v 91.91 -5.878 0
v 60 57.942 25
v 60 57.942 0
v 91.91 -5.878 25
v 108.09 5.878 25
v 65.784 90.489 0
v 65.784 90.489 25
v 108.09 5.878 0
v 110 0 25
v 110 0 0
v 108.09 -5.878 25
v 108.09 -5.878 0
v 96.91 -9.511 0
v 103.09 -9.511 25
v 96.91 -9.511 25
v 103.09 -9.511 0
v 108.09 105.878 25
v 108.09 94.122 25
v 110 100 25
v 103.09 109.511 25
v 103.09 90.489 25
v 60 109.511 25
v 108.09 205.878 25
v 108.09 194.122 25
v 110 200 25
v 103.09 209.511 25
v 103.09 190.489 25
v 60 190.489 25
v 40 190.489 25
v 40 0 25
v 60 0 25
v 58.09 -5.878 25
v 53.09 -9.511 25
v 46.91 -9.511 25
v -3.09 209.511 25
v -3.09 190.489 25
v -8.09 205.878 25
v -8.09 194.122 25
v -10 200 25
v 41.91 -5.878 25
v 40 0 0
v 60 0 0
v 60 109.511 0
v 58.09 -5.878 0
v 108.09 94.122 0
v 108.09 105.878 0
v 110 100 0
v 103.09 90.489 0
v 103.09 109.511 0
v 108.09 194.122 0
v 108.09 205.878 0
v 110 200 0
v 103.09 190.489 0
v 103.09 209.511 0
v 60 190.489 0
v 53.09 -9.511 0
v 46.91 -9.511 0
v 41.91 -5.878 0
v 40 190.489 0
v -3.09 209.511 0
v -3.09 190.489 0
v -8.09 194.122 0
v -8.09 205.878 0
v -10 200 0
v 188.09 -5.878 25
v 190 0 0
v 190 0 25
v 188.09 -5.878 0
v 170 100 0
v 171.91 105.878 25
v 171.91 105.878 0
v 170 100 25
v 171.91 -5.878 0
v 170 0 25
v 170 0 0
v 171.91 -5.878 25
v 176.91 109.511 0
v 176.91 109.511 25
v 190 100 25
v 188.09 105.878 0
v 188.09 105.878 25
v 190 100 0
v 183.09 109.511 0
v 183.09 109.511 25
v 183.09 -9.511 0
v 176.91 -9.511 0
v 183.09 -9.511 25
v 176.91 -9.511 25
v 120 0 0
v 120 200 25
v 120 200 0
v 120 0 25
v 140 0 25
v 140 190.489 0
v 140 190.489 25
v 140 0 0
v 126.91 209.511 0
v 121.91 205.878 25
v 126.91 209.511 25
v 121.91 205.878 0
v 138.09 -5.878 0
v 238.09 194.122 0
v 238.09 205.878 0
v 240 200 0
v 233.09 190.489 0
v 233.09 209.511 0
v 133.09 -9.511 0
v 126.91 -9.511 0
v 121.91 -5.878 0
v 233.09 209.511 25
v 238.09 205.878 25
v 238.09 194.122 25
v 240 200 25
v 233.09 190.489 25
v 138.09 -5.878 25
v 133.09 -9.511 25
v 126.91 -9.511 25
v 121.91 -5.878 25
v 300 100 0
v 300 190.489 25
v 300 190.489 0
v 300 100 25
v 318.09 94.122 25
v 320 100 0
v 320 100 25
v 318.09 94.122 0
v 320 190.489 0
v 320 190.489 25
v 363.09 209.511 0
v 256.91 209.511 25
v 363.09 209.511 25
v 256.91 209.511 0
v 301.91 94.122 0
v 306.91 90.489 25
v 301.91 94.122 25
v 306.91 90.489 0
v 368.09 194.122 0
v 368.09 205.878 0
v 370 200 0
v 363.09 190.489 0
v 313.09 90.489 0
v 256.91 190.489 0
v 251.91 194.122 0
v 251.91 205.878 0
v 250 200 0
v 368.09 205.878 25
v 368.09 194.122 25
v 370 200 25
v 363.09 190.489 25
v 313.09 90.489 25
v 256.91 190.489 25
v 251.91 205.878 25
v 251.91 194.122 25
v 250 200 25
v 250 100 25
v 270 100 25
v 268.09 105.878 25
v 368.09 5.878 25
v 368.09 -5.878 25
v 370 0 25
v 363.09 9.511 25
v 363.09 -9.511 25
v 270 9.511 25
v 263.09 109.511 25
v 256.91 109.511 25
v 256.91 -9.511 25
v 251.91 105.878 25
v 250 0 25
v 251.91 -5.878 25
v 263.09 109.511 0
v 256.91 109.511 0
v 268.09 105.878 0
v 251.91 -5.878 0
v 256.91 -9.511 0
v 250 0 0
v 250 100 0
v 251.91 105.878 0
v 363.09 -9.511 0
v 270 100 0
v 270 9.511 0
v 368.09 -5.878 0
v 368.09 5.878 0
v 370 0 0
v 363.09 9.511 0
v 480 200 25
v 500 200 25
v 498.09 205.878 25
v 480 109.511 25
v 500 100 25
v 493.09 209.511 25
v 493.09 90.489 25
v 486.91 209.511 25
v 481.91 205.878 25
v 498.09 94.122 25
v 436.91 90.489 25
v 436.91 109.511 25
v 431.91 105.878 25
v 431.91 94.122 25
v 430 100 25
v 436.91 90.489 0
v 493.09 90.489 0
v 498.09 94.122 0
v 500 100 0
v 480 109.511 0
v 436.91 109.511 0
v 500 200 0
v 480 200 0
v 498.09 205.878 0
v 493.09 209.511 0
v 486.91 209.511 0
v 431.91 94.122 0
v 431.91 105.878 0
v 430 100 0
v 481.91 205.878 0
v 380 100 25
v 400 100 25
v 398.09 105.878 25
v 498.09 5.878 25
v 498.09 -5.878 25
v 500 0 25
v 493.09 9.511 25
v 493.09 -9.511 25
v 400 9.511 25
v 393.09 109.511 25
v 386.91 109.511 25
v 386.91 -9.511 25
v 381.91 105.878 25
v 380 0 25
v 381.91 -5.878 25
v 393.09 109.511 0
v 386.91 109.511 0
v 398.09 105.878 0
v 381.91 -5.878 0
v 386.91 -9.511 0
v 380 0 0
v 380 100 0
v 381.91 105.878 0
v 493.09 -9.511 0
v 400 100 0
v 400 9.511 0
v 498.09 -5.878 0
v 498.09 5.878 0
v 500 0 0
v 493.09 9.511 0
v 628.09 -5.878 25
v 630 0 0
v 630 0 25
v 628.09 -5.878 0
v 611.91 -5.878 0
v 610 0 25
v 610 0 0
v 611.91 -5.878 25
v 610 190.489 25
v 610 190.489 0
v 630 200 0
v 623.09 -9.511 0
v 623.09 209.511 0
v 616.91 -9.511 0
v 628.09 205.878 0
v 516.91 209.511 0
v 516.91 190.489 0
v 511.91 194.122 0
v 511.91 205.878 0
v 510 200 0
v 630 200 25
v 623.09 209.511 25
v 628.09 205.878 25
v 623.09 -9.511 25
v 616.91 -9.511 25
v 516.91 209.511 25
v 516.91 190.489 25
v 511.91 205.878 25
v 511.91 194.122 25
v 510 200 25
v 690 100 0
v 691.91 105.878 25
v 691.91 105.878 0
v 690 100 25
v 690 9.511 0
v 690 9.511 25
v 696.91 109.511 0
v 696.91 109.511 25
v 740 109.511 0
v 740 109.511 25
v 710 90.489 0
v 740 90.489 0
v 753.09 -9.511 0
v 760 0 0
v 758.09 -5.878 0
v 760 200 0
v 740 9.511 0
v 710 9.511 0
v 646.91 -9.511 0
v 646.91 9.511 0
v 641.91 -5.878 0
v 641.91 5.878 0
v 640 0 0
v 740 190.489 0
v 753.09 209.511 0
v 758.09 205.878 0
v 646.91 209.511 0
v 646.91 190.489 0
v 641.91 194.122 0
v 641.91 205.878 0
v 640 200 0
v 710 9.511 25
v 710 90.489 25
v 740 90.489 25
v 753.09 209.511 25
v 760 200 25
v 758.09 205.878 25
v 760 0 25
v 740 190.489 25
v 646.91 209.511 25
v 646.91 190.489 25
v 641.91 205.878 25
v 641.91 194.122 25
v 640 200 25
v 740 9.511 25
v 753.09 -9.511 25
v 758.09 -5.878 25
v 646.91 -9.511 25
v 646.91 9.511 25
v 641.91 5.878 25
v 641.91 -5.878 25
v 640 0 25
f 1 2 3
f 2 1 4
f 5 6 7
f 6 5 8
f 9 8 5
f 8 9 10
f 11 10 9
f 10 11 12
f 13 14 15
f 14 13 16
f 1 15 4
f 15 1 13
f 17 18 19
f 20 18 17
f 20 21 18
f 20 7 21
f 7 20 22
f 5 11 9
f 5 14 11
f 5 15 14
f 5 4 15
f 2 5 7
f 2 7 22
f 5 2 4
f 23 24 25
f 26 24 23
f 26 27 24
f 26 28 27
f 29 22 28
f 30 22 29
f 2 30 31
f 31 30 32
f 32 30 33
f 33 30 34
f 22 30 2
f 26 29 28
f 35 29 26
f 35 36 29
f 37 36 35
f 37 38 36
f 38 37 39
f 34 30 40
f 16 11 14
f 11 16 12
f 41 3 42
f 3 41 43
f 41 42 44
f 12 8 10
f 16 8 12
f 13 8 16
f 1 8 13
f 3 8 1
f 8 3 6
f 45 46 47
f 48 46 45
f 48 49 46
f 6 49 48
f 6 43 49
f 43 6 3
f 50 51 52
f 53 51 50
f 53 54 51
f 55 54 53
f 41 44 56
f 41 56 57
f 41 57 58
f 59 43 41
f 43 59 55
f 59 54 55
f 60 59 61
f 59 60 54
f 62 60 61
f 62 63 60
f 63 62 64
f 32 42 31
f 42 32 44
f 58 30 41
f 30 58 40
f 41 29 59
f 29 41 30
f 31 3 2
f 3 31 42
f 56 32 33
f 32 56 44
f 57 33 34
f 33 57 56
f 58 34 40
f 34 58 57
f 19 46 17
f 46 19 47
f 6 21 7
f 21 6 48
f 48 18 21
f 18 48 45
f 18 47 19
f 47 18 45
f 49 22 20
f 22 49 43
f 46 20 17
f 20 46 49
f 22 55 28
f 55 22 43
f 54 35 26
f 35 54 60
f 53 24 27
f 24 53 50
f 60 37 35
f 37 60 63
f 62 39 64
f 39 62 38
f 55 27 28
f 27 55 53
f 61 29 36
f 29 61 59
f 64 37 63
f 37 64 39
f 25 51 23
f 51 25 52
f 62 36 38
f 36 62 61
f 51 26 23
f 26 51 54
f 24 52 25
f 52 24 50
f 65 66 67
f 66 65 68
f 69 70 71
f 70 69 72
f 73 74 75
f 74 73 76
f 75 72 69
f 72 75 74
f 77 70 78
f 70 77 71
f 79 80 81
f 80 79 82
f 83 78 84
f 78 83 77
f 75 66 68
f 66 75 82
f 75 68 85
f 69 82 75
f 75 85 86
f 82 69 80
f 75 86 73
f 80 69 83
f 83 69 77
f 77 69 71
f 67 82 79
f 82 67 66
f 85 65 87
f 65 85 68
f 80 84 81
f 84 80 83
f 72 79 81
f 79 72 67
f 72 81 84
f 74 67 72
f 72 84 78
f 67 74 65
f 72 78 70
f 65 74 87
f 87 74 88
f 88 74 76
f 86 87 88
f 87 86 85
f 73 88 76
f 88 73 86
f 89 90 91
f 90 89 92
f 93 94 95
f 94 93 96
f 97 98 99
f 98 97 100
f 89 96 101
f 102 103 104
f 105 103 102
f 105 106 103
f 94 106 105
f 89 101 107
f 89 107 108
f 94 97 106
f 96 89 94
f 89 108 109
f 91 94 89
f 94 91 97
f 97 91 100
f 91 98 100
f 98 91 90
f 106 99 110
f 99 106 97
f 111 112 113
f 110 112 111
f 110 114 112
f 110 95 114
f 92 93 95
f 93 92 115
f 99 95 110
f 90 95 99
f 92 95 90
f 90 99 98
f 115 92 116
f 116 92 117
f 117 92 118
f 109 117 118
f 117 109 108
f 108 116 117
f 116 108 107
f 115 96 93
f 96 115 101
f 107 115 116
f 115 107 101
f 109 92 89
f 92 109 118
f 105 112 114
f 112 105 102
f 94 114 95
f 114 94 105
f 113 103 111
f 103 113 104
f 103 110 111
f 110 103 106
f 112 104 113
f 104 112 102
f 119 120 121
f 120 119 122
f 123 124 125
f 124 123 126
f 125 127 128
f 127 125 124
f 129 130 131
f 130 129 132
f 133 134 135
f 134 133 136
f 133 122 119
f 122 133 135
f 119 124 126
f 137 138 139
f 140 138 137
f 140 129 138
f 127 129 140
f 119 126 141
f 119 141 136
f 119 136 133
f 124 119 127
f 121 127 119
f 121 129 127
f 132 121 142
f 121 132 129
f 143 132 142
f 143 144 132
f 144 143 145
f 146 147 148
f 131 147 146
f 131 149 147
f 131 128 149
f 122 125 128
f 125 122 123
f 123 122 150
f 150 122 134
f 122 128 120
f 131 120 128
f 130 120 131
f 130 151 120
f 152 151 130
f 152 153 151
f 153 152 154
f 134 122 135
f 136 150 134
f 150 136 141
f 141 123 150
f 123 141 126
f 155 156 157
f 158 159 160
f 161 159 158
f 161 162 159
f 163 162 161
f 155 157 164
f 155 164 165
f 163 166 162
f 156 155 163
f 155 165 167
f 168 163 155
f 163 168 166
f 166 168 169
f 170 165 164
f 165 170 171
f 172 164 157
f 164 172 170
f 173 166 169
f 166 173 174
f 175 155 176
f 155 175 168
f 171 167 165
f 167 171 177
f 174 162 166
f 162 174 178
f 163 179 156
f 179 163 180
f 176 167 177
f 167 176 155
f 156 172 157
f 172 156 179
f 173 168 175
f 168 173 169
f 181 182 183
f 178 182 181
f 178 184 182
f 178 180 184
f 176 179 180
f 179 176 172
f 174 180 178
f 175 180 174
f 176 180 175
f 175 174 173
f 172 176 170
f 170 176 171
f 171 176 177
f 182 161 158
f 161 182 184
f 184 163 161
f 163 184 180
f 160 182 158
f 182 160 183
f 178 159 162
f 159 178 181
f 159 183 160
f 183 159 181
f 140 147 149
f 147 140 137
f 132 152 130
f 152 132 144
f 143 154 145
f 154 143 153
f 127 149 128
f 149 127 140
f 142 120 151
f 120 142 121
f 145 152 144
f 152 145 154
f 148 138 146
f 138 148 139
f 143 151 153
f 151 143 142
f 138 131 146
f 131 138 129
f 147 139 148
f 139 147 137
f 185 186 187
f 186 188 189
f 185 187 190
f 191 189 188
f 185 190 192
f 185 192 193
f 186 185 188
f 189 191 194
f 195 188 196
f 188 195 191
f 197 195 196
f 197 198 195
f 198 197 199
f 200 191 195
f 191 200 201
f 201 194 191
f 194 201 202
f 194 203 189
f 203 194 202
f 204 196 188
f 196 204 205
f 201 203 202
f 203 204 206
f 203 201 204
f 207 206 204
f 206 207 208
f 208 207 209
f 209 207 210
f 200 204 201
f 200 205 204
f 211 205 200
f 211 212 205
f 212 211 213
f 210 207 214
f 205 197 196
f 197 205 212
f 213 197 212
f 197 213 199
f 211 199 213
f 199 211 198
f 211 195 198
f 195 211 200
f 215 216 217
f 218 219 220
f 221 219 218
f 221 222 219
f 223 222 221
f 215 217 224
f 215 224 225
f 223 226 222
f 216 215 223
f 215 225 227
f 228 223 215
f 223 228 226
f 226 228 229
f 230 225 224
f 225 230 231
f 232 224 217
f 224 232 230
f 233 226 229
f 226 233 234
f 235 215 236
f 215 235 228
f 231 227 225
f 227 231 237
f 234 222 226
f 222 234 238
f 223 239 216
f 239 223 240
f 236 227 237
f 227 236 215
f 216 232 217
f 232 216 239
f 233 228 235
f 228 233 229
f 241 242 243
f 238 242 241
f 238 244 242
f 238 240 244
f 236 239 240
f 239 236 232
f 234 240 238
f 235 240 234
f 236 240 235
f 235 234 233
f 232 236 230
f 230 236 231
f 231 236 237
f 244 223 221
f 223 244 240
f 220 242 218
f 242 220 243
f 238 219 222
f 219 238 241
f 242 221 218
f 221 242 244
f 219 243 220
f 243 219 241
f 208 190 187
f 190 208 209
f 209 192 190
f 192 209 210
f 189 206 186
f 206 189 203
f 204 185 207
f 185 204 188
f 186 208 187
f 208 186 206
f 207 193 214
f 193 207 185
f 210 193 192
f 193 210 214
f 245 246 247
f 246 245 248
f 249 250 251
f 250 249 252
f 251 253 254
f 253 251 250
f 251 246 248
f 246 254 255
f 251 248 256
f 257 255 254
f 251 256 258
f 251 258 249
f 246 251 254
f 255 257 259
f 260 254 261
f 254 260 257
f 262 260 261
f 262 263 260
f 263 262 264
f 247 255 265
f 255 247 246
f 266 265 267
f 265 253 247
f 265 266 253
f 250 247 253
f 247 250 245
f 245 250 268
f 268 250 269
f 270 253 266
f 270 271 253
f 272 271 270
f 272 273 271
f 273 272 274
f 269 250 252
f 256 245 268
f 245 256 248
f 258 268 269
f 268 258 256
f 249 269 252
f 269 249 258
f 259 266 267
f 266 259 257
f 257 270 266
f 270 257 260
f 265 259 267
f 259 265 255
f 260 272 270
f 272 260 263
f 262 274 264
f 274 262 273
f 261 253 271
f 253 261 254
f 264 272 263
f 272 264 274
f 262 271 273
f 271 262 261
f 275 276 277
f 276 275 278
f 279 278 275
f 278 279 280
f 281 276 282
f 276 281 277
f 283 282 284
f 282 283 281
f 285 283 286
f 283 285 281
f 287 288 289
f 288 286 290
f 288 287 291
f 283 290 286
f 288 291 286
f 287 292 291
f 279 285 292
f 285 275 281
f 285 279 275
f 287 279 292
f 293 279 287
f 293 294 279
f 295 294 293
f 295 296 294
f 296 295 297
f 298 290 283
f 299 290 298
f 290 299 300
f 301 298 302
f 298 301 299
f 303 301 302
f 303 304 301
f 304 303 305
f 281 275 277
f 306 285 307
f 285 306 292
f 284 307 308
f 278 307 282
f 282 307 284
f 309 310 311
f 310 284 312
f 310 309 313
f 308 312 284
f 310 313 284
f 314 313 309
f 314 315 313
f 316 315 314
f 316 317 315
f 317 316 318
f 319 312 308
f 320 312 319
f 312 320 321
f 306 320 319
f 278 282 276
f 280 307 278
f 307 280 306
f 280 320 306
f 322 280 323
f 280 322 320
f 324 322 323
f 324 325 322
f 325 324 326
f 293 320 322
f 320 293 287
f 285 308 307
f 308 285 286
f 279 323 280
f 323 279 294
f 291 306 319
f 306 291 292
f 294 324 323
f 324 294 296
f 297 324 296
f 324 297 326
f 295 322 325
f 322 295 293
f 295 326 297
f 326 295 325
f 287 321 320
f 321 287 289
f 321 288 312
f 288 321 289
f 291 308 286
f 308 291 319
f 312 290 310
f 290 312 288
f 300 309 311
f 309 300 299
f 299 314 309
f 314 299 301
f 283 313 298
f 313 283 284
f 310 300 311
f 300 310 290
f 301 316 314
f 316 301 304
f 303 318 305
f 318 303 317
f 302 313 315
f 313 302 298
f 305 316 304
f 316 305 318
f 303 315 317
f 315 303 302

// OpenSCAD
// IMPORTANT; Required openScad 2019.5!!!!
// https://www.openscad.org/downloads.html

// ETH0 - CTF - 2020
// Puzzle created by Anykey & Espardemee


// complete the variables and render :-)

// ALL ANSWERS in lower case!
eth0_2019_location = "xxxxx"; 
fusion360_maker = "xxxxx";
dutch_3d_printer_manufacturer = "xxxxx";
CPU_chip_model_raspberryPi4 = "xxxxx";
Arduino_language_based_on = "xxxxx";
Ladyada_last_name = "xxxxx";

// Show the FLAG
stringtovalue(1, eth0_2019_location, 1897);
stringtovalue(2, fusion360_maker, -295);
stringtovalue(3, dutch_3d_printer_manufacturer, -511);
stringtovalue(4, CPU_chip_model_raspberryPi4, -446);
stringtovalue(5, Arduino_language_based_on, -593);
stringtovalue(6, Ladyada_last_name, -201);

$fn=10;
segments = [ 
  [ 0,200, 100,200],
  [ 100,100, 100,200],
  [ 100,0, 100,100],
  [ 0,0, 100,0],
  [ 0,0 , 0,100],
  [ 0,100,0,200],
  [ 50,200,50,100],
  [ 50, 100, 100,100],
  [ 50,0, 50, 100],
  [ 0,100, 50,100],
  [ 50,100, 100,200],
  [ 50,100, 100,0],
  [ 50,100, 0,0],
  [ 50,100, 0, 200]
  ];
  

module toBin(number){
    for (b =[14:-1:0]) {
     bit = floor(number / pow(2, b)) % 2;
     if (bit == 1) {
         hull(){
        translate([segments[b][0], segments[b][1]])
          cylinder (r=10, h = 25);
        translate([segments[b][2], segments[b][3]])
          cylinder (r=10, h = 25);
         }
     }
    }
}

function sum(list, idx = 0, result = 0) = idx >= len(list) ? result : sum(list, idx + 1, result + list[idx]);

module  stringtovalue(p, answer, special) {
 v = [for (c = answer) ord(c)];
 echo(sum(v));
 translate( [(p*130)-130,0,0])
    toBin(sum(v) + special);
    
}





    
